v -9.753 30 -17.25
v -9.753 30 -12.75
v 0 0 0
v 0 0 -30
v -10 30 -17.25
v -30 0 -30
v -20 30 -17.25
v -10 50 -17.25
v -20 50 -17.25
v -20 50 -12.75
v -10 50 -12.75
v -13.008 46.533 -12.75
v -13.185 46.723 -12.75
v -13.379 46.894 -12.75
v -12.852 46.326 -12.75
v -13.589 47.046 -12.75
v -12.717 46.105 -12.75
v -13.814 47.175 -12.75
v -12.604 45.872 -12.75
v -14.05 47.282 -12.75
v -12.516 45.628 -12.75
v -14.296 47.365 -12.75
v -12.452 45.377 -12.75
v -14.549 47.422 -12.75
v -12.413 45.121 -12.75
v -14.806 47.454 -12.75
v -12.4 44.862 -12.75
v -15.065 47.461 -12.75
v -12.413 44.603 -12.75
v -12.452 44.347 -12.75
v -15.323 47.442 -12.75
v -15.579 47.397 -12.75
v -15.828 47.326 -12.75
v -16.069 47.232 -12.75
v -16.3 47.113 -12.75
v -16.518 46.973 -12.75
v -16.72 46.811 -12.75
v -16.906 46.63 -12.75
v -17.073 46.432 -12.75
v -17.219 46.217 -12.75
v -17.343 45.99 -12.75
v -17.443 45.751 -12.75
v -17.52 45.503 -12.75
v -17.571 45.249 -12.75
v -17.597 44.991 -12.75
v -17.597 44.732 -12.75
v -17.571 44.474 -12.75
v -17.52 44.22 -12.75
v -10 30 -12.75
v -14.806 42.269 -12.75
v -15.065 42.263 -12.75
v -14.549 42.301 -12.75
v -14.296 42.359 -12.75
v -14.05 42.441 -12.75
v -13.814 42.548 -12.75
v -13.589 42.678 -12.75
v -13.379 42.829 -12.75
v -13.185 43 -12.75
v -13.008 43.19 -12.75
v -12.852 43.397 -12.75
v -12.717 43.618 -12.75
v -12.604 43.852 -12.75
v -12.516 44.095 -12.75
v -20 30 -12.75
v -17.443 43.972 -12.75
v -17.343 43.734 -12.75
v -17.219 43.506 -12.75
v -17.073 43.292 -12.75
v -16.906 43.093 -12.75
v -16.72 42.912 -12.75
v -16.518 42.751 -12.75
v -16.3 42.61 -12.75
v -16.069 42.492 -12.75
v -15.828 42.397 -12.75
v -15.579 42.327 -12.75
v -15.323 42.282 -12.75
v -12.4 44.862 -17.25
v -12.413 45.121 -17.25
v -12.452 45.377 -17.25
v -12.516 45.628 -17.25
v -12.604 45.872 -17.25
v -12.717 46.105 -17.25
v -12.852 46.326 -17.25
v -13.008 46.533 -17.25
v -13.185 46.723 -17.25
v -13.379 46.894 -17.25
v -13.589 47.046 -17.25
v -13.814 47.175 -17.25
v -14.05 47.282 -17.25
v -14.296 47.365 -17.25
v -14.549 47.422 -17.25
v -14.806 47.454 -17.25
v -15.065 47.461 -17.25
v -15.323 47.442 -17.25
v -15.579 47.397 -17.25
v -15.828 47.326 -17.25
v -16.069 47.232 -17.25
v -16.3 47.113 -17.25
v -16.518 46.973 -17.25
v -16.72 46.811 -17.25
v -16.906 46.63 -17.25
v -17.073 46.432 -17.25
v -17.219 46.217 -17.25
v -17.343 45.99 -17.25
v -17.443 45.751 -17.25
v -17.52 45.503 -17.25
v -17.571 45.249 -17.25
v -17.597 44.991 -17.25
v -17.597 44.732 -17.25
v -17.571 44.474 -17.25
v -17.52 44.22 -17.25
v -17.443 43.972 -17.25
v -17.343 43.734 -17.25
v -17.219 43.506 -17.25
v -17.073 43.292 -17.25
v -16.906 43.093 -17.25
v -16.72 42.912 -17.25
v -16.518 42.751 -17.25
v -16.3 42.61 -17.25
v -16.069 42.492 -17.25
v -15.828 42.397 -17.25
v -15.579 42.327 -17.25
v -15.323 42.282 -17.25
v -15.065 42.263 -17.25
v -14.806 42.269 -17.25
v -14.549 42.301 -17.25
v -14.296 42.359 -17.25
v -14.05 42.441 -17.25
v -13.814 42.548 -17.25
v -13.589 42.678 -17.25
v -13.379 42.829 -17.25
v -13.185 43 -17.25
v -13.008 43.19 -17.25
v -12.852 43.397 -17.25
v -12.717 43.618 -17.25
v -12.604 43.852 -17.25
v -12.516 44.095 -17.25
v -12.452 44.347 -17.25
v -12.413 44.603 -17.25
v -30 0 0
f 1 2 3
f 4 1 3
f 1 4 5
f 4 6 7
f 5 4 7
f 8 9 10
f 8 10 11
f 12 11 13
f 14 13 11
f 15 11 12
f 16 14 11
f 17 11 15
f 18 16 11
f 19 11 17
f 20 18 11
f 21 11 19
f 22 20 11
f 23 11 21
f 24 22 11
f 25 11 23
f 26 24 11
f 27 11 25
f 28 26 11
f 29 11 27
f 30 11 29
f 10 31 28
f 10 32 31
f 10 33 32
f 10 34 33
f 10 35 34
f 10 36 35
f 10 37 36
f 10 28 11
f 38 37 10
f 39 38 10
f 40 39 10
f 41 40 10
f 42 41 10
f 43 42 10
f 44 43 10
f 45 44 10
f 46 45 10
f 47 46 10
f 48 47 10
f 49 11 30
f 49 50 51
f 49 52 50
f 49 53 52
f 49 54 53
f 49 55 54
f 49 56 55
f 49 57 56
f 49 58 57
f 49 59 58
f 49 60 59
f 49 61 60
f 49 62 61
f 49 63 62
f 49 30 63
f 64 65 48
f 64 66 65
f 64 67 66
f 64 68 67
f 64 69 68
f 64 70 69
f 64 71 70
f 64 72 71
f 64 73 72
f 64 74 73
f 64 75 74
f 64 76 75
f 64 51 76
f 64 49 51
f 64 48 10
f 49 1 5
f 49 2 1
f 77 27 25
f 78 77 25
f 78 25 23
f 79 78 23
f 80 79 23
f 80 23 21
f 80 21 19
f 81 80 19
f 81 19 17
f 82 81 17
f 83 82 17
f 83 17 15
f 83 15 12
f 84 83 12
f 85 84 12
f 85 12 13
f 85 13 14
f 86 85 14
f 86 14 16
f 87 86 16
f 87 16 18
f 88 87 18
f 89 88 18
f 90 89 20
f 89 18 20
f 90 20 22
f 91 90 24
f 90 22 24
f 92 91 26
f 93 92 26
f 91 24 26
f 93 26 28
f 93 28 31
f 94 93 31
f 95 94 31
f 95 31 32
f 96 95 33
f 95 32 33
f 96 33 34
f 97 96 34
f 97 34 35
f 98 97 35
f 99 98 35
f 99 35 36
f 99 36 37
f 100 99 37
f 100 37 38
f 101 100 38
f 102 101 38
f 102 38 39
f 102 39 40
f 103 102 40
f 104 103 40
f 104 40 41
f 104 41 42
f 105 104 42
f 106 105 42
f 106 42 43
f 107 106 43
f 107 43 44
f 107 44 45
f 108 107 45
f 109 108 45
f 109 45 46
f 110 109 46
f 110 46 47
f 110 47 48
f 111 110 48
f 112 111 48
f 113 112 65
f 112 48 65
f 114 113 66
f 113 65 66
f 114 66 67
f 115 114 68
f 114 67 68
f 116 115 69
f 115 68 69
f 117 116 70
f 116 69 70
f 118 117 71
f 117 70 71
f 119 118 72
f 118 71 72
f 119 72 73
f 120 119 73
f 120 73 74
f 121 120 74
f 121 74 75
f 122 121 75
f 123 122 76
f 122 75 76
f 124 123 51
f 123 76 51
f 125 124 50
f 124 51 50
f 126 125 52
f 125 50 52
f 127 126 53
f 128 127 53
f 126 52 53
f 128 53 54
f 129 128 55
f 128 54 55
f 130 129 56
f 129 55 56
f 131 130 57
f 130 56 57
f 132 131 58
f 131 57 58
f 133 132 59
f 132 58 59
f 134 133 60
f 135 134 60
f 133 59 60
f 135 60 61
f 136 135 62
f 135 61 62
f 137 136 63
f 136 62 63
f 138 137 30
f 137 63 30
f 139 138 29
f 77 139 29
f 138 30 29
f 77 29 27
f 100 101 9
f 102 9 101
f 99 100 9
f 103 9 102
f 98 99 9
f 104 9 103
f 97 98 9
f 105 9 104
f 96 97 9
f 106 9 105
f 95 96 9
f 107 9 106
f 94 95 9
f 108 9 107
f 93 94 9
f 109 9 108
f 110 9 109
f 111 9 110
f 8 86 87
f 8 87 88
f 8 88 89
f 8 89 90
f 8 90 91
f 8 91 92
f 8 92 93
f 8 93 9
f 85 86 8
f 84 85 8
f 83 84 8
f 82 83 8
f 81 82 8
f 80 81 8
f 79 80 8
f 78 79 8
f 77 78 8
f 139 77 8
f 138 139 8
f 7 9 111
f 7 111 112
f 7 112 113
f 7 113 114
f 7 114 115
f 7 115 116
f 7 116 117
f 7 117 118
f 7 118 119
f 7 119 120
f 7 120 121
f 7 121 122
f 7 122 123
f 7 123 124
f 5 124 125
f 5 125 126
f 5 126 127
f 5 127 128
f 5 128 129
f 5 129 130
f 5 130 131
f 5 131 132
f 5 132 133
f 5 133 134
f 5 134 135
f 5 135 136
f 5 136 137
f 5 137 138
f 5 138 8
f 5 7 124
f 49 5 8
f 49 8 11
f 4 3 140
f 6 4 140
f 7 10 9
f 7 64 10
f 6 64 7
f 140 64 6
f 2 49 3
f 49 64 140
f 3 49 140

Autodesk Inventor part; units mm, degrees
ref_plane "YZ Plane" through (0, 0, 0) normal (1, 0, 0) x (0, 1, 0)
ref_plane "XZ Plane" through (0, 0, 0) normal (0, 1, 0) x (-1, 0, 0)
ref_plane "XY Plane" through (0, 0, 0) normal (0, 0, 1) x (1, 0, 0)
sketch "Sketch1" plane through (0, 0, 0) normal (0, 1, 0) x (-1, 0, 0)
  line L0 (0, 0) -> (30, 0)
  line L1 (30, 0) -> (30, -30)
  line L2 (30, -30) -> (0, -30)
  line L3 (0, -30) -> (0, 0)
  dimension "d0" = 30
  dimension "d1" = 30
extrude "Extrusion1" add sketch "Sketch1" along normal blind 30
sketch "Sketch2" plane through (0, 30, 0) normal (0, 1, 0) x (1, 0, 0)
  line L0 (-20, 17.25) -> (-10, 17.25)
  line L1 (-10, 17.25) -> (-10, 12.75)
  line L2 (-10, 12.75) -> (-20, 12.75)
  line L3 (-20, 12.75) -> (-20, 17.25)
  line L4 (-20, 17.25) -> (-10, 12.75) construction
  line L5 (-10, 17.25) -> (-20, 12.75) construction
  line L6 (-30, 30) -> (-30, 0) projected
  line L7 (-30, 0) -> (0, 0) projected
  point P0 (-15, 15)
  point P1 (-30, 15)
  dimension "d4" = 15
  dimension "d5" = 15
  dimension "d6" = 10
  dimension "d7" = 4.5
extrude "Extrusion2" add sketch "Sketch2" along normal blind 20
sketch "Sketch3" plane through (-20, 30, -12.75) normal (0, 0, 1) x (1, 0, 0)
  circle A0 centre (5, 14.8617) radius 2.6
  point P0 (20, -30)
  dimension "d10" = 5.2
extrude "Extrusion3" cut sketch "Sketch3" against normal blind 20
sketch "Sketch4" plane through (-30, 0, 0) normal (0, 0, 1) x (1, 0, 0)
  line L0 (10, 30) -> (20, 30) projected
  line L1 (0, 0) -> (0, 30) projected
  line L2 (10, 30) -> (0, 0)
  line L3 (0, 0) -> (0, 30)
  line L4 (0, 30) -> (10, 30)
  line L5 (0, 30) -> (30, 30) projected
  line L6 (20.2474, 30) -> (30, 0)
  line L7 (30, 0) -> (30, 30) projected
  line L8 (30, 0) -> (30, 30)
  line L9 (30, 30) -> (20.2474, 30)
extrude "Extrusion4" cut sketch "Sketch4" against normal blind 71.25
sketch "Sketch6" plane through (-10, 30, -12.75) normal (1, 0, 0) x (0, 0, -1)
  line L0 (0, 0) -> (-12.75, -30)
  line L1 (-12.75, -30) -> (-12.75, 0) projected
  line L2 (-12.75, -30) -> (-12.75, 0)
  line L3 (0, 0) -> (-12.75, 0) projected
  line L4 (-12.75, 0) -> (0, 0)
  line L5 (17.25, 0) -> (4.5, 0) projected
  line L6 (0, 0) -> (4.5, 0)
  line L7 (4.5, 0) -> (17.25, 0)
  line L8 (17.25, 0) -> (17.25, -30) projected
  line L9 (17.25, 0) -> (17.25, -30)
  line L10 (4.5, 0) -> (4.5, 20) projected
  line L11 (17.25, -30) -> (4.5, 0)
extrude "Extrusion5" cut sketch "Sketch6" along normal blind 71.25 and the other way blind 35.625
properties part number "ObjectPyrsmid"
